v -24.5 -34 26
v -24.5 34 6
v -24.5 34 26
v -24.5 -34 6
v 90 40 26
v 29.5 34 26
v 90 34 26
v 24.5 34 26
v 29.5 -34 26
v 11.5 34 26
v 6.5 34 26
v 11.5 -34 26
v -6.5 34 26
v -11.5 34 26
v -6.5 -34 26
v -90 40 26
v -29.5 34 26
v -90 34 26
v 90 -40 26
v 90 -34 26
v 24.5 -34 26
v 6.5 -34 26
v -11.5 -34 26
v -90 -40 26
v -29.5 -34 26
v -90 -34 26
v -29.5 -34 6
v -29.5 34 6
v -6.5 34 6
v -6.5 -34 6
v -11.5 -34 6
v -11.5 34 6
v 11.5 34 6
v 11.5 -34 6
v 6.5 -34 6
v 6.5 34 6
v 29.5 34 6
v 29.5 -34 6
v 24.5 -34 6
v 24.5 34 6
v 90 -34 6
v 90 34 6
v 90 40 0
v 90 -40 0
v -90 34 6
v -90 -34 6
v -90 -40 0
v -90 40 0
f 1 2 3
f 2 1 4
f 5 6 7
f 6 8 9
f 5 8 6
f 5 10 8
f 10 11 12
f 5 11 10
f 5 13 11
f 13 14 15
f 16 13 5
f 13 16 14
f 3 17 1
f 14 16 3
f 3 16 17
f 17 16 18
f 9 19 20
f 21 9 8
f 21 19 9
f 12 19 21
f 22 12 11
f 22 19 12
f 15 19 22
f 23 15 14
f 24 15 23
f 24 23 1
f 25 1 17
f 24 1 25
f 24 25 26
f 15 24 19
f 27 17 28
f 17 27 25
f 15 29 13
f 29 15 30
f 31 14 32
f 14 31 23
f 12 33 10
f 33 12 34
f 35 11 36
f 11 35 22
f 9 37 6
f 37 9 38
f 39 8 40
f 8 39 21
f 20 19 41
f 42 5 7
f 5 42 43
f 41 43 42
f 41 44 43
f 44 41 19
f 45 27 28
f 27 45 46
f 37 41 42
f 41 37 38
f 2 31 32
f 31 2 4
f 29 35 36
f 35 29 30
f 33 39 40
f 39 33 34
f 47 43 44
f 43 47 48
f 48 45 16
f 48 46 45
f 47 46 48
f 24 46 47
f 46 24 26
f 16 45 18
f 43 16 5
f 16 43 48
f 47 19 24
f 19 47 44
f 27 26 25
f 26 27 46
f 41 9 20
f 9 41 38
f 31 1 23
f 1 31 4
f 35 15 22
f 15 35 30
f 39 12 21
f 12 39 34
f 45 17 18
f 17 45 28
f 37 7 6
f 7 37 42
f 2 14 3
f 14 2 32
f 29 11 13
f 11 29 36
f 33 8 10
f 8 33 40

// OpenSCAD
$fn = 32;

// ----------------------------------------------------------------------
// Rib frame 180 x 80 x 26
// 4 ribs at 18 mm pitch
// ----------------------------------------------------------------------

// --- parameters (mm) ---
frame = [180, 80, 6];  // base plate size (x, y, z)
rail_w = 6;            // side rail width
ribs = 4;              // number of ribs
rib_t = 5;             // rib thickness
rib_h = 20;            // rib height above the base plate
pitch = 18;            // pitch between rib centres

// --- derived feature positions (mm) ---
span = (ribs - 1) * pitch;          // = 54   distance between the outer ribs
origin_x = -span / 2;               // = -27   X of the first rib
rib_len = frame[1] - 2 * rail_w + 2;  // = 70   rib length, 1 mm into each rail
feature_centers = [
  [origin_x + 0 * pitch, 0],
  [origin_x + 1 * pitch, 0],
  [origin_x + 2 * pitch, 0],
  [origin_x + 3 * pitch, 0]
];   // rib centre line, drives the rib loop

// base plate, two side rails, then the ribs read straight off feature_centers
union() {
  translate([-frame[0] / 2, -frame[1] / 2, 0]) cube(frame);
  translate([-frame[0] / 2, -frame[1] / 2, 0]) cube([frame[0], rail_w, frame[2] + rib_h]);
  translate([-frame[0] / 2, frame[1] / 2 - rail_w, 0]) cube([frame[0], rail_w, frame[2] + rib_h]);
  for (centre = feature_centers)
    translate([centre[0] - rib_t / 2, centre[1] - rib_len / 2, frame[2] - 1])
      cube([rib_t, rib_len, rib_h + 1]);
}
